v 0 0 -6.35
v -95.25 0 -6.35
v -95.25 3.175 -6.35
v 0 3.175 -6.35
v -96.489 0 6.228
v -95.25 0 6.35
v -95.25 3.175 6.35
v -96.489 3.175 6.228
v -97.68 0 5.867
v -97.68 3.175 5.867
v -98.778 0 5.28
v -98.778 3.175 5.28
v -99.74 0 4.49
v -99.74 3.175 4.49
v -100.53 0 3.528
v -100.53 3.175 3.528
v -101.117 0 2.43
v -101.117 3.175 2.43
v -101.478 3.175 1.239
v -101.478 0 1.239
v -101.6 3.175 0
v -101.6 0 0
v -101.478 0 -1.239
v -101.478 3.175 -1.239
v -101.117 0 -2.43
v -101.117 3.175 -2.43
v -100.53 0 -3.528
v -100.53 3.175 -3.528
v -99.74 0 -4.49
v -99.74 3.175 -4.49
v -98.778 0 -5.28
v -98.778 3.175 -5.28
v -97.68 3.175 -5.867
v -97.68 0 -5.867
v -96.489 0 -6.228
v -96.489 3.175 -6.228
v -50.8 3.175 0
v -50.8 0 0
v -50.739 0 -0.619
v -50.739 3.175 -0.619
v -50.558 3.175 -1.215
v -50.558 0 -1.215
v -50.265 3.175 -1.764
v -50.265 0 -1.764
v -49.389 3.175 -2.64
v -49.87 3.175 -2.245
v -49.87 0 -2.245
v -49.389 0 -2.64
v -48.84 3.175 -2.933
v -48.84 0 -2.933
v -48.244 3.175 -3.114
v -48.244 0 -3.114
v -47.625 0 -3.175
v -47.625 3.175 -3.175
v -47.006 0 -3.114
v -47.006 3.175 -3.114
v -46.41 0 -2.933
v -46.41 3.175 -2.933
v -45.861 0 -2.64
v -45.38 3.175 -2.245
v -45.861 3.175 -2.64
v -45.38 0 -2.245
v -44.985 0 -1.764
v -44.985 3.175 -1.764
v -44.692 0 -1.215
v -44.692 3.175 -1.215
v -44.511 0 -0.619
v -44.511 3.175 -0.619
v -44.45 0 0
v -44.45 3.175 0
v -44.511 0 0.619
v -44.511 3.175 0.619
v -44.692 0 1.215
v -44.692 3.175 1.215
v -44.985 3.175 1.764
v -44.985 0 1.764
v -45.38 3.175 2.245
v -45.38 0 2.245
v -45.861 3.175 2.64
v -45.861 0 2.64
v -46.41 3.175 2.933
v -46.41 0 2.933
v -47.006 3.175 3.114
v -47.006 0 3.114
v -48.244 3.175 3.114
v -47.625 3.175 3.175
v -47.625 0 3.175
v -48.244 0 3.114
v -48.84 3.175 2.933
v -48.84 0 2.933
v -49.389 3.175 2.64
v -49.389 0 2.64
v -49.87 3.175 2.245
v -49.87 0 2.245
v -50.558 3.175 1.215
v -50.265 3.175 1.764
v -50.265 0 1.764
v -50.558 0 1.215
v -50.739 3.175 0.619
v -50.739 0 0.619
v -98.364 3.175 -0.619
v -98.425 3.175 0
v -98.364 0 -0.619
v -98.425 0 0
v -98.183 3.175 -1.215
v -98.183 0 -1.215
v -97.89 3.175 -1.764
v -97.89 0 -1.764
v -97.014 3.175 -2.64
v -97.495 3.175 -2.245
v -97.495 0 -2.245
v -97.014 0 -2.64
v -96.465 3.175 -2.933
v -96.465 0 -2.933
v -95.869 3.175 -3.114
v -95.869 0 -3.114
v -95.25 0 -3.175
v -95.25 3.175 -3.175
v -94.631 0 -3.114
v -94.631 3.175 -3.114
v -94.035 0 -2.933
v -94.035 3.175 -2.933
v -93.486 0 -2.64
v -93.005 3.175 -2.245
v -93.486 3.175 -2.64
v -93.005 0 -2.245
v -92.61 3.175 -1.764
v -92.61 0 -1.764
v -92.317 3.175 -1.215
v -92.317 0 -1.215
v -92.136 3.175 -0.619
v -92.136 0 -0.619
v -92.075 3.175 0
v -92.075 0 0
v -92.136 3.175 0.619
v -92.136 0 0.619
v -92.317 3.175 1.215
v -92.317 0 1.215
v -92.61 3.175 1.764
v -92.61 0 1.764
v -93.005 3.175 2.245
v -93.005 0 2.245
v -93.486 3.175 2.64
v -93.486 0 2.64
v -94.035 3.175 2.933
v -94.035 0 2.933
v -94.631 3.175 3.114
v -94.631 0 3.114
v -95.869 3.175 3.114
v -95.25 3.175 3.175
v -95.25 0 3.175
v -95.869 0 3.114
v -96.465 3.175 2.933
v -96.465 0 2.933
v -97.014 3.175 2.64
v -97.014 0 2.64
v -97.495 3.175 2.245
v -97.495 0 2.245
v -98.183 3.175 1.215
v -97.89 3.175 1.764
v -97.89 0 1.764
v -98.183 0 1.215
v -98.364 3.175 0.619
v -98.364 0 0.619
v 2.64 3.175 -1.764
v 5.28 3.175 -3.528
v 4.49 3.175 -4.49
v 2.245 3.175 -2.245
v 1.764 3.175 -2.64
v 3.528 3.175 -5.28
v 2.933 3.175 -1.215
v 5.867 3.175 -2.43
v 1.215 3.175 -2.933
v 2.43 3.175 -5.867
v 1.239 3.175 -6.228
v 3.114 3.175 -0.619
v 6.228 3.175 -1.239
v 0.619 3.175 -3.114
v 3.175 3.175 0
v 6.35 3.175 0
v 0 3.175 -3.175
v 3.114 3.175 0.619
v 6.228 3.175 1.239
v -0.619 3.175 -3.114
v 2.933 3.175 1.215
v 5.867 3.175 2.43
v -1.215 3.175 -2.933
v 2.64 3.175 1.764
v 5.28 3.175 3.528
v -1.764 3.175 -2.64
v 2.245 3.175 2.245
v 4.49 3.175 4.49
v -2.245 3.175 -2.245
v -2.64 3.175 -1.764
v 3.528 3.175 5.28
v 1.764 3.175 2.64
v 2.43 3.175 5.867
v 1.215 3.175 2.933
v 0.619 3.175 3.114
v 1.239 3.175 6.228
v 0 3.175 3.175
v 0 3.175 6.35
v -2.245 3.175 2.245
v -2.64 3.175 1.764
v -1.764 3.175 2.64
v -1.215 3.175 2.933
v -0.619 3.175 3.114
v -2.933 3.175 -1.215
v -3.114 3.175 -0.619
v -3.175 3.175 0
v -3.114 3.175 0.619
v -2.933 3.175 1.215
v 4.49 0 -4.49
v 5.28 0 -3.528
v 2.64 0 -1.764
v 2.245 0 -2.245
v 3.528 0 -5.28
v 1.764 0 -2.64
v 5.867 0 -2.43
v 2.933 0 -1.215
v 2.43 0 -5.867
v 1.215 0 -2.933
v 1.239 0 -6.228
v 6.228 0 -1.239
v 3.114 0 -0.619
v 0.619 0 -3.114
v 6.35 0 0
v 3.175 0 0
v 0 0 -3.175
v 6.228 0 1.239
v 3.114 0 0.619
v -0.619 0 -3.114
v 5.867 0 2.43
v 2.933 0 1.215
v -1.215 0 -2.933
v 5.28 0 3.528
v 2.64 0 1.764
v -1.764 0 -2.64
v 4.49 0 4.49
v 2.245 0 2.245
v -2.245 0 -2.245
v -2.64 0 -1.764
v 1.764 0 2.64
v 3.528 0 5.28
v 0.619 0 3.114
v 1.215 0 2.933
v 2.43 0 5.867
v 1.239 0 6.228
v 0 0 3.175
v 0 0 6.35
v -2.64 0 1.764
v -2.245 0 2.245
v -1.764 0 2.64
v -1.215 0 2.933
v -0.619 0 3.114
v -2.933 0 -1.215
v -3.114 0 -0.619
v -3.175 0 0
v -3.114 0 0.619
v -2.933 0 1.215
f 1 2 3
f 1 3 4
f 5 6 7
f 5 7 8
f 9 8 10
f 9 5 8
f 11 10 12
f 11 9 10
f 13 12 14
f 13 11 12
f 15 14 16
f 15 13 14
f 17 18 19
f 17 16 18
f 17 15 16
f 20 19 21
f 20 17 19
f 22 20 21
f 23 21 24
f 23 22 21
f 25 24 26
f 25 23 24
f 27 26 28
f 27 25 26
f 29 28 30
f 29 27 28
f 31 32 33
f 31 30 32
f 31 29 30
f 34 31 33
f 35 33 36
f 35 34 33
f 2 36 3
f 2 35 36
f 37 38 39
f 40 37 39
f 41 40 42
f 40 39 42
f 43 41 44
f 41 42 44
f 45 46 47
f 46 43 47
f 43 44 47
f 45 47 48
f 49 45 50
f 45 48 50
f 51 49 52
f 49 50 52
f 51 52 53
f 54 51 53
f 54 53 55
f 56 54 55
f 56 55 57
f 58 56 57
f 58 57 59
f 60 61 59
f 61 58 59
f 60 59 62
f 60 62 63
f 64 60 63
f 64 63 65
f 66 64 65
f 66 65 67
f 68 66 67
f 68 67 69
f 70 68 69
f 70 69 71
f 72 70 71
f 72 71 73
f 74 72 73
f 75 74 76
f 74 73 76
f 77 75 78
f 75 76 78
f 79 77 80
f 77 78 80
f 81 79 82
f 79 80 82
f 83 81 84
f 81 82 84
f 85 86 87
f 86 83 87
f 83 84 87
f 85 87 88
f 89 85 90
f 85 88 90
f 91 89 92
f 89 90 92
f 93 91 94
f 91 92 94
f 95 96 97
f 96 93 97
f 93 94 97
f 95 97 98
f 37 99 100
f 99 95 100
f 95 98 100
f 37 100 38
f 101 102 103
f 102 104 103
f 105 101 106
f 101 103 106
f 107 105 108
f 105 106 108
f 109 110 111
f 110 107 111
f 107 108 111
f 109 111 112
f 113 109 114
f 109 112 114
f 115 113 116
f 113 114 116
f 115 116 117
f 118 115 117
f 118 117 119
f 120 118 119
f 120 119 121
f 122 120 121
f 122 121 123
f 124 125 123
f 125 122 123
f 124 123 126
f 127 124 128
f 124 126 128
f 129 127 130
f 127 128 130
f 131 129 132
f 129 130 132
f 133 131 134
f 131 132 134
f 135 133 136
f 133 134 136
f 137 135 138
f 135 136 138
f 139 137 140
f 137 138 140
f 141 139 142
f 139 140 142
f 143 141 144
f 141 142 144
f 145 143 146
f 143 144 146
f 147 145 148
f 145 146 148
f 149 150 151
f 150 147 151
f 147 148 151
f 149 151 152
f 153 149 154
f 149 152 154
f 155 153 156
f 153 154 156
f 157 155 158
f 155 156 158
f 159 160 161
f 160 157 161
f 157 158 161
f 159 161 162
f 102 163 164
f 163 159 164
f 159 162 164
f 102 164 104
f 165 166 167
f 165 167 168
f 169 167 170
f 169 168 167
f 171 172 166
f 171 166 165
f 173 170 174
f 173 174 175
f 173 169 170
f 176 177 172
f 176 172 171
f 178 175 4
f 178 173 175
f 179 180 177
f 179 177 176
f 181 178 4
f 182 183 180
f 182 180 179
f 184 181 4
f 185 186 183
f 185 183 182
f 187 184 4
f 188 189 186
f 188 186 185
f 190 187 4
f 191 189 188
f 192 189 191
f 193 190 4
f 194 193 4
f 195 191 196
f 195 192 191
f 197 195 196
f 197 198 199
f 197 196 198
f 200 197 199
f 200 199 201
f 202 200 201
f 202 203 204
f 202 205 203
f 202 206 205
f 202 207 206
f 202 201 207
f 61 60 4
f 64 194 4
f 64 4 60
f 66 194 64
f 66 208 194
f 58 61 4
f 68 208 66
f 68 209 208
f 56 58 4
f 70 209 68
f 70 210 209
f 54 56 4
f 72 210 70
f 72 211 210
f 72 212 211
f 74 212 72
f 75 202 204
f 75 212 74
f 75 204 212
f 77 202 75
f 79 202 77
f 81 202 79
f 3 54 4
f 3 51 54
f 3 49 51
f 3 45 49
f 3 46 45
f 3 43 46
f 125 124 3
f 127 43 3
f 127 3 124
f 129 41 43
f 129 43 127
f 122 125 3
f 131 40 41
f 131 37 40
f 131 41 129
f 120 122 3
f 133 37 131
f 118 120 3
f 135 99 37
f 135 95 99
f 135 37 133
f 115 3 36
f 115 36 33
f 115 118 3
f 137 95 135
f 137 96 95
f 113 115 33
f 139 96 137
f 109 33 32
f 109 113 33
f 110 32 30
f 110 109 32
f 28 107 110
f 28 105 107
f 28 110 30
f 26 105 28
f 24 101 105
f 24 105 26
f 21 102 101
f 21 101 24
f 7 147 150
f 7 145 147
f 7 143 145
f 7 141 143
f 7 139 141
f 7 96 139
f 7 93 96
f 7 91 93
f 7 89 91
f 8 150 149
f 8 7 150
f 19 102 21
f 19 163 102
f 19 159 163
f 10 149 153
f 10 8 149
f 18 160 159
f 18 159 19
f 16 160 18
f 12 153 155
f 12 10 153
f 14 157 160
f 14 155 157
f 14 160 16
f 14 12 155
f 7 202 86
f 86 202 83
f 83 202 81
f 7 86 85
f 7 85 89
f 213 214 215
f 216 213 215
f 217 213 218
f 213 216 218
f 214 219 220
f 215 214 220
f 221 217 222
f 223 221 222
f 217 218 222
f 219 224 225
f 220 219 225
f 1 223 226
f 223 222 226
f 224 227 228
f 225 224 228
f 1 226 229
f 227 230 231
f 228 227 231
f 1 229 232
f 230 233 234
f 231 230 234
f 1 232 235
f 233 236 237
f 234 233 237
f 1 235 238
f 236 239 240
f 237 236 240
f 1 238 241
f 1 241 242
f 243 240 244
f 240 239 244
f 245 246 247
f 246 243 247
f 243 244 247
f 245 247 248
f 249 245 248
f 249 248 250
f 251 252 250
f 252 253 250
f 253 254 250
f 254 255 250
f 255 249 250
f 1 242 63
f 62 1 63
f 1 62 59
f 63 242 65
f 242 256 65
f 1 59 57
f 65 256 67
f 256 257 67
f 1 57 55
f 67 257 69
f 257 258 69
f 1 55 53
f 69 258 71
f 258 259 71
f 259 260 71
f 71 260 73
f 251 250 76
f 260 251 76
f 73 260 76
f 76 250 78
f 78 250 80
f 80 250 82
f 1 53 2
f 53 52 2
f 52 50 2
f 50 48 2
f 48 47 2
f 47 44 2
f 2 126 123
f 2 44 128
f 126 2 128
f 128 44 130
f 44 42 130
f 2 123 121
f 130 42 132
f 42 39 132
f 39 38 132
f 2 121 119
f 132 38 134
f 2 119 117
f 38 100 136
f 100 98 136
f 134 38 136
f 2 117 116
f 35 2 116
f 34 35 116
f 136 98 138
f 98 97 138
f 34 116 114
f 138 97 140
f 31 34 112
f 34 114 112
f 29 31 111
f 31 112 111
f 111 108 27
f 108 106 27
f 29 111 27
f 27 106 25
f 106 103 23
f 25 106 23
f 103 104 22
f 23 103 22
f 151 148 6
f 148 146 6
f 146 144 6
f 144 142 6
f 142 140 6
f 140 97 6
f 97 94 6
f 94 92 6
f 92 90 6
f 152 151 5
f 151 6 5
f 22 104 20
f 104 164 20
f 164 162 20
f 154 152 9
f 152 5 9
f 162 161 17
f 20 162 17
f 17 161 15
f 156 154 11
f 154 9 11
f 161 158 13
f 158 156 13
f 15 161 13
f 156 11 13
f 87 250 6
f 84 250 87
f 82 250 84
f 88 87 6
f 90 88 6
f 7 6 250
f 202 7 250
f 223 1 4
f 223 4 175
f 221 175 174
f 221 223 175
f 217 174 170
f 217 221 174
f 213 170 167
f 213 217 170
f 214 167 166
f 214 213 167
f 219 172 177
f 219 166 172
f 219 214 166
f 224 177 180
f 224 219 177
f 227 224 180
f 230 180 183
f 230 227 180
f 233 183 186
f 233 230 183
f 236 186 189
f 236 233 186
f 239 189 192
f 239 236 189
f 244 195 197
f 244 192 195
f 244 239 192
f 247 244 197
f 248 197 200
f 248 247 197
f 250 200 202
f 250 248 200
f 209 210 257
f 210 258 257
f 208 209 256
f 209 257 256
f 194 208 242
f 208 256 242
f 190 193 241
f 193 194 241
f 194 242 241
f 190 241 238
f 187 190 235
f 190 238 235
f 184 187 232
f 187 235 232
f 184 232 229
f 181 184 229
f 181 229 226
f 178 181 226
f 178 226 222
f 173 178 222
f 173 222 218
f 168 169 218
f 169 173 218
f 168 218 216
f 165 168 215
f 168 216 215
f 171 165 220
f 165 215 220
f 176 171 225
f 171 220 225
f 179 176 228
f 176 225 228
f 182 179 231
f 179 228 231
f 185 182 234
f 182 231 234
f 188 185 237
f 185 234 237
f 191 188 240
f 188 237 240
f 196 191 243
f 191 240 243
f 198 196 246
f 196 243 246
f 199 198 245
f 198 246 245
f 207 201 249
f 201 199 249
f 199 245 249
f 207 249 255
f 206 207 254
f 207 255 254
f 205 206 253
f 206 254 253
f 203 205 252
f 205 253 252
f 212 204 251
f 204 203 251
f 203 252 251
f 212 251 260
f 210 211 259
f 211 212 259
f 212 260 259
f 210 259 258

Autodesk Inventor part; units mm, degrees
ref_plane "YZ Plane" through (0, 0, 0) normal (1, 0, 0) x (0, 1, 0)
ref_plane "XZ Plane" through (0, 0, 0) normal (0, 1, 0) x (-1, 0, 0)
ref_plane "XY Plane" through (0, 0, 0) normal (0, 0, 1) x (1, 0, 0)
sketch "Sketch1" plane through (0, 0, 0) normal (0, 1, 0) x (-1, 0, 0)
  circle A0 centre (0, 0) radius 3.175
  circle A1 centre (95.25, 0) radius 3.175
  line L0 (95.25, 6.35) -> (0, 6.35)
  line L1 (95.25, -6.35) -> (0, -6.35)
  line L2 (95.25, 0) -> (0, 0) construction
  arc A2 (95.25, -6.35) -> (95.25, 6.35) centre (95.25, 0) ccw
  arc A3 (0, 6.35) -> (0, -6.35) centre (0, 0) ccw
  circle A4 centre (47.625, 0) radius 3.175
  dimension "d0" = 6.35
  dimension "d1" = 6.35
  dimension "d2" = 95.25
  dimension "d3" = 12.7
  dimension "d4" = 6.35
extrude "Extrusion1" add sketch "Sketch1" along normal blind 3.175
sketch "Sketch2" plane through (0, 3.175, 0) normal (0, 1, 0) x (1, 0, 0)
  circle A0 centre (0, 0) radius 6.35
  circle A1 centre (0, 0) radius 31.75
  dimension "d7" = 12.7
  dimension "d8" = 63.5
extrude "Extrusion2" [suppressed]
sketch "Sketch3" plane through (0, 3.175, 0) normal (0, 1, 0) x (1, 0, 0)
  line L0 (-3.6662, 6.35) -> (3.6662, 6.35)
  line L1 (3.6662, 6.35) -> (7.3323, 0)
  line L2 (7.3323, 0) -> (3.6662, -6.35)
  line L3 (3.6662, -6.35) -> (-3.6662, -6.35)
  line L4 (-3.6662, -6.35) -> (-7.3323, 0)
  line L5 (-7.3323, 0) -> (-3.6662, 6.35)
  circle A0 centre (-23.8125, 0) radius 2.54
  circle A1 centre (0, 0) radius 23.8125 construction
  circle A2 centre (-11.9062, -20.6222) radius 2.54
  circle A3 centre (11.9062, -20.6222) radius 2.54
  circle A4 centre (23.8125, 0) radius 2.54
  circle A5 centre (11.9062, 20.6222) radius 2.54
  circle A6 centre (-11.9063, 20.6222) radius 2.54
  circle A7 centre (0, 0) radius 12.7
  arc A8 (-31.1085, -6.35) -> (-31.1085, 6.35) centre (0, 0) ccw projected
  line L6 (-31.1085, -6.35) -> (-2.6494, -12.4206)
  line L7 (0, 6.35) -> (-95.25, 6.35) projected
  line L8 (-31.1085, 6.35) -> (-2.6494, 12.4206)
  dimension "d13" = 47.625
  dimension "d11" = 12.7
  dimension "d12" = 5.08
  dimension "d16" = 360
  dimension "d20" = 25.4
extrude "Extrusion3" [suppressed]
properties part number "OUTK_019_PanikSiscior" material "Aluminum 6061"
